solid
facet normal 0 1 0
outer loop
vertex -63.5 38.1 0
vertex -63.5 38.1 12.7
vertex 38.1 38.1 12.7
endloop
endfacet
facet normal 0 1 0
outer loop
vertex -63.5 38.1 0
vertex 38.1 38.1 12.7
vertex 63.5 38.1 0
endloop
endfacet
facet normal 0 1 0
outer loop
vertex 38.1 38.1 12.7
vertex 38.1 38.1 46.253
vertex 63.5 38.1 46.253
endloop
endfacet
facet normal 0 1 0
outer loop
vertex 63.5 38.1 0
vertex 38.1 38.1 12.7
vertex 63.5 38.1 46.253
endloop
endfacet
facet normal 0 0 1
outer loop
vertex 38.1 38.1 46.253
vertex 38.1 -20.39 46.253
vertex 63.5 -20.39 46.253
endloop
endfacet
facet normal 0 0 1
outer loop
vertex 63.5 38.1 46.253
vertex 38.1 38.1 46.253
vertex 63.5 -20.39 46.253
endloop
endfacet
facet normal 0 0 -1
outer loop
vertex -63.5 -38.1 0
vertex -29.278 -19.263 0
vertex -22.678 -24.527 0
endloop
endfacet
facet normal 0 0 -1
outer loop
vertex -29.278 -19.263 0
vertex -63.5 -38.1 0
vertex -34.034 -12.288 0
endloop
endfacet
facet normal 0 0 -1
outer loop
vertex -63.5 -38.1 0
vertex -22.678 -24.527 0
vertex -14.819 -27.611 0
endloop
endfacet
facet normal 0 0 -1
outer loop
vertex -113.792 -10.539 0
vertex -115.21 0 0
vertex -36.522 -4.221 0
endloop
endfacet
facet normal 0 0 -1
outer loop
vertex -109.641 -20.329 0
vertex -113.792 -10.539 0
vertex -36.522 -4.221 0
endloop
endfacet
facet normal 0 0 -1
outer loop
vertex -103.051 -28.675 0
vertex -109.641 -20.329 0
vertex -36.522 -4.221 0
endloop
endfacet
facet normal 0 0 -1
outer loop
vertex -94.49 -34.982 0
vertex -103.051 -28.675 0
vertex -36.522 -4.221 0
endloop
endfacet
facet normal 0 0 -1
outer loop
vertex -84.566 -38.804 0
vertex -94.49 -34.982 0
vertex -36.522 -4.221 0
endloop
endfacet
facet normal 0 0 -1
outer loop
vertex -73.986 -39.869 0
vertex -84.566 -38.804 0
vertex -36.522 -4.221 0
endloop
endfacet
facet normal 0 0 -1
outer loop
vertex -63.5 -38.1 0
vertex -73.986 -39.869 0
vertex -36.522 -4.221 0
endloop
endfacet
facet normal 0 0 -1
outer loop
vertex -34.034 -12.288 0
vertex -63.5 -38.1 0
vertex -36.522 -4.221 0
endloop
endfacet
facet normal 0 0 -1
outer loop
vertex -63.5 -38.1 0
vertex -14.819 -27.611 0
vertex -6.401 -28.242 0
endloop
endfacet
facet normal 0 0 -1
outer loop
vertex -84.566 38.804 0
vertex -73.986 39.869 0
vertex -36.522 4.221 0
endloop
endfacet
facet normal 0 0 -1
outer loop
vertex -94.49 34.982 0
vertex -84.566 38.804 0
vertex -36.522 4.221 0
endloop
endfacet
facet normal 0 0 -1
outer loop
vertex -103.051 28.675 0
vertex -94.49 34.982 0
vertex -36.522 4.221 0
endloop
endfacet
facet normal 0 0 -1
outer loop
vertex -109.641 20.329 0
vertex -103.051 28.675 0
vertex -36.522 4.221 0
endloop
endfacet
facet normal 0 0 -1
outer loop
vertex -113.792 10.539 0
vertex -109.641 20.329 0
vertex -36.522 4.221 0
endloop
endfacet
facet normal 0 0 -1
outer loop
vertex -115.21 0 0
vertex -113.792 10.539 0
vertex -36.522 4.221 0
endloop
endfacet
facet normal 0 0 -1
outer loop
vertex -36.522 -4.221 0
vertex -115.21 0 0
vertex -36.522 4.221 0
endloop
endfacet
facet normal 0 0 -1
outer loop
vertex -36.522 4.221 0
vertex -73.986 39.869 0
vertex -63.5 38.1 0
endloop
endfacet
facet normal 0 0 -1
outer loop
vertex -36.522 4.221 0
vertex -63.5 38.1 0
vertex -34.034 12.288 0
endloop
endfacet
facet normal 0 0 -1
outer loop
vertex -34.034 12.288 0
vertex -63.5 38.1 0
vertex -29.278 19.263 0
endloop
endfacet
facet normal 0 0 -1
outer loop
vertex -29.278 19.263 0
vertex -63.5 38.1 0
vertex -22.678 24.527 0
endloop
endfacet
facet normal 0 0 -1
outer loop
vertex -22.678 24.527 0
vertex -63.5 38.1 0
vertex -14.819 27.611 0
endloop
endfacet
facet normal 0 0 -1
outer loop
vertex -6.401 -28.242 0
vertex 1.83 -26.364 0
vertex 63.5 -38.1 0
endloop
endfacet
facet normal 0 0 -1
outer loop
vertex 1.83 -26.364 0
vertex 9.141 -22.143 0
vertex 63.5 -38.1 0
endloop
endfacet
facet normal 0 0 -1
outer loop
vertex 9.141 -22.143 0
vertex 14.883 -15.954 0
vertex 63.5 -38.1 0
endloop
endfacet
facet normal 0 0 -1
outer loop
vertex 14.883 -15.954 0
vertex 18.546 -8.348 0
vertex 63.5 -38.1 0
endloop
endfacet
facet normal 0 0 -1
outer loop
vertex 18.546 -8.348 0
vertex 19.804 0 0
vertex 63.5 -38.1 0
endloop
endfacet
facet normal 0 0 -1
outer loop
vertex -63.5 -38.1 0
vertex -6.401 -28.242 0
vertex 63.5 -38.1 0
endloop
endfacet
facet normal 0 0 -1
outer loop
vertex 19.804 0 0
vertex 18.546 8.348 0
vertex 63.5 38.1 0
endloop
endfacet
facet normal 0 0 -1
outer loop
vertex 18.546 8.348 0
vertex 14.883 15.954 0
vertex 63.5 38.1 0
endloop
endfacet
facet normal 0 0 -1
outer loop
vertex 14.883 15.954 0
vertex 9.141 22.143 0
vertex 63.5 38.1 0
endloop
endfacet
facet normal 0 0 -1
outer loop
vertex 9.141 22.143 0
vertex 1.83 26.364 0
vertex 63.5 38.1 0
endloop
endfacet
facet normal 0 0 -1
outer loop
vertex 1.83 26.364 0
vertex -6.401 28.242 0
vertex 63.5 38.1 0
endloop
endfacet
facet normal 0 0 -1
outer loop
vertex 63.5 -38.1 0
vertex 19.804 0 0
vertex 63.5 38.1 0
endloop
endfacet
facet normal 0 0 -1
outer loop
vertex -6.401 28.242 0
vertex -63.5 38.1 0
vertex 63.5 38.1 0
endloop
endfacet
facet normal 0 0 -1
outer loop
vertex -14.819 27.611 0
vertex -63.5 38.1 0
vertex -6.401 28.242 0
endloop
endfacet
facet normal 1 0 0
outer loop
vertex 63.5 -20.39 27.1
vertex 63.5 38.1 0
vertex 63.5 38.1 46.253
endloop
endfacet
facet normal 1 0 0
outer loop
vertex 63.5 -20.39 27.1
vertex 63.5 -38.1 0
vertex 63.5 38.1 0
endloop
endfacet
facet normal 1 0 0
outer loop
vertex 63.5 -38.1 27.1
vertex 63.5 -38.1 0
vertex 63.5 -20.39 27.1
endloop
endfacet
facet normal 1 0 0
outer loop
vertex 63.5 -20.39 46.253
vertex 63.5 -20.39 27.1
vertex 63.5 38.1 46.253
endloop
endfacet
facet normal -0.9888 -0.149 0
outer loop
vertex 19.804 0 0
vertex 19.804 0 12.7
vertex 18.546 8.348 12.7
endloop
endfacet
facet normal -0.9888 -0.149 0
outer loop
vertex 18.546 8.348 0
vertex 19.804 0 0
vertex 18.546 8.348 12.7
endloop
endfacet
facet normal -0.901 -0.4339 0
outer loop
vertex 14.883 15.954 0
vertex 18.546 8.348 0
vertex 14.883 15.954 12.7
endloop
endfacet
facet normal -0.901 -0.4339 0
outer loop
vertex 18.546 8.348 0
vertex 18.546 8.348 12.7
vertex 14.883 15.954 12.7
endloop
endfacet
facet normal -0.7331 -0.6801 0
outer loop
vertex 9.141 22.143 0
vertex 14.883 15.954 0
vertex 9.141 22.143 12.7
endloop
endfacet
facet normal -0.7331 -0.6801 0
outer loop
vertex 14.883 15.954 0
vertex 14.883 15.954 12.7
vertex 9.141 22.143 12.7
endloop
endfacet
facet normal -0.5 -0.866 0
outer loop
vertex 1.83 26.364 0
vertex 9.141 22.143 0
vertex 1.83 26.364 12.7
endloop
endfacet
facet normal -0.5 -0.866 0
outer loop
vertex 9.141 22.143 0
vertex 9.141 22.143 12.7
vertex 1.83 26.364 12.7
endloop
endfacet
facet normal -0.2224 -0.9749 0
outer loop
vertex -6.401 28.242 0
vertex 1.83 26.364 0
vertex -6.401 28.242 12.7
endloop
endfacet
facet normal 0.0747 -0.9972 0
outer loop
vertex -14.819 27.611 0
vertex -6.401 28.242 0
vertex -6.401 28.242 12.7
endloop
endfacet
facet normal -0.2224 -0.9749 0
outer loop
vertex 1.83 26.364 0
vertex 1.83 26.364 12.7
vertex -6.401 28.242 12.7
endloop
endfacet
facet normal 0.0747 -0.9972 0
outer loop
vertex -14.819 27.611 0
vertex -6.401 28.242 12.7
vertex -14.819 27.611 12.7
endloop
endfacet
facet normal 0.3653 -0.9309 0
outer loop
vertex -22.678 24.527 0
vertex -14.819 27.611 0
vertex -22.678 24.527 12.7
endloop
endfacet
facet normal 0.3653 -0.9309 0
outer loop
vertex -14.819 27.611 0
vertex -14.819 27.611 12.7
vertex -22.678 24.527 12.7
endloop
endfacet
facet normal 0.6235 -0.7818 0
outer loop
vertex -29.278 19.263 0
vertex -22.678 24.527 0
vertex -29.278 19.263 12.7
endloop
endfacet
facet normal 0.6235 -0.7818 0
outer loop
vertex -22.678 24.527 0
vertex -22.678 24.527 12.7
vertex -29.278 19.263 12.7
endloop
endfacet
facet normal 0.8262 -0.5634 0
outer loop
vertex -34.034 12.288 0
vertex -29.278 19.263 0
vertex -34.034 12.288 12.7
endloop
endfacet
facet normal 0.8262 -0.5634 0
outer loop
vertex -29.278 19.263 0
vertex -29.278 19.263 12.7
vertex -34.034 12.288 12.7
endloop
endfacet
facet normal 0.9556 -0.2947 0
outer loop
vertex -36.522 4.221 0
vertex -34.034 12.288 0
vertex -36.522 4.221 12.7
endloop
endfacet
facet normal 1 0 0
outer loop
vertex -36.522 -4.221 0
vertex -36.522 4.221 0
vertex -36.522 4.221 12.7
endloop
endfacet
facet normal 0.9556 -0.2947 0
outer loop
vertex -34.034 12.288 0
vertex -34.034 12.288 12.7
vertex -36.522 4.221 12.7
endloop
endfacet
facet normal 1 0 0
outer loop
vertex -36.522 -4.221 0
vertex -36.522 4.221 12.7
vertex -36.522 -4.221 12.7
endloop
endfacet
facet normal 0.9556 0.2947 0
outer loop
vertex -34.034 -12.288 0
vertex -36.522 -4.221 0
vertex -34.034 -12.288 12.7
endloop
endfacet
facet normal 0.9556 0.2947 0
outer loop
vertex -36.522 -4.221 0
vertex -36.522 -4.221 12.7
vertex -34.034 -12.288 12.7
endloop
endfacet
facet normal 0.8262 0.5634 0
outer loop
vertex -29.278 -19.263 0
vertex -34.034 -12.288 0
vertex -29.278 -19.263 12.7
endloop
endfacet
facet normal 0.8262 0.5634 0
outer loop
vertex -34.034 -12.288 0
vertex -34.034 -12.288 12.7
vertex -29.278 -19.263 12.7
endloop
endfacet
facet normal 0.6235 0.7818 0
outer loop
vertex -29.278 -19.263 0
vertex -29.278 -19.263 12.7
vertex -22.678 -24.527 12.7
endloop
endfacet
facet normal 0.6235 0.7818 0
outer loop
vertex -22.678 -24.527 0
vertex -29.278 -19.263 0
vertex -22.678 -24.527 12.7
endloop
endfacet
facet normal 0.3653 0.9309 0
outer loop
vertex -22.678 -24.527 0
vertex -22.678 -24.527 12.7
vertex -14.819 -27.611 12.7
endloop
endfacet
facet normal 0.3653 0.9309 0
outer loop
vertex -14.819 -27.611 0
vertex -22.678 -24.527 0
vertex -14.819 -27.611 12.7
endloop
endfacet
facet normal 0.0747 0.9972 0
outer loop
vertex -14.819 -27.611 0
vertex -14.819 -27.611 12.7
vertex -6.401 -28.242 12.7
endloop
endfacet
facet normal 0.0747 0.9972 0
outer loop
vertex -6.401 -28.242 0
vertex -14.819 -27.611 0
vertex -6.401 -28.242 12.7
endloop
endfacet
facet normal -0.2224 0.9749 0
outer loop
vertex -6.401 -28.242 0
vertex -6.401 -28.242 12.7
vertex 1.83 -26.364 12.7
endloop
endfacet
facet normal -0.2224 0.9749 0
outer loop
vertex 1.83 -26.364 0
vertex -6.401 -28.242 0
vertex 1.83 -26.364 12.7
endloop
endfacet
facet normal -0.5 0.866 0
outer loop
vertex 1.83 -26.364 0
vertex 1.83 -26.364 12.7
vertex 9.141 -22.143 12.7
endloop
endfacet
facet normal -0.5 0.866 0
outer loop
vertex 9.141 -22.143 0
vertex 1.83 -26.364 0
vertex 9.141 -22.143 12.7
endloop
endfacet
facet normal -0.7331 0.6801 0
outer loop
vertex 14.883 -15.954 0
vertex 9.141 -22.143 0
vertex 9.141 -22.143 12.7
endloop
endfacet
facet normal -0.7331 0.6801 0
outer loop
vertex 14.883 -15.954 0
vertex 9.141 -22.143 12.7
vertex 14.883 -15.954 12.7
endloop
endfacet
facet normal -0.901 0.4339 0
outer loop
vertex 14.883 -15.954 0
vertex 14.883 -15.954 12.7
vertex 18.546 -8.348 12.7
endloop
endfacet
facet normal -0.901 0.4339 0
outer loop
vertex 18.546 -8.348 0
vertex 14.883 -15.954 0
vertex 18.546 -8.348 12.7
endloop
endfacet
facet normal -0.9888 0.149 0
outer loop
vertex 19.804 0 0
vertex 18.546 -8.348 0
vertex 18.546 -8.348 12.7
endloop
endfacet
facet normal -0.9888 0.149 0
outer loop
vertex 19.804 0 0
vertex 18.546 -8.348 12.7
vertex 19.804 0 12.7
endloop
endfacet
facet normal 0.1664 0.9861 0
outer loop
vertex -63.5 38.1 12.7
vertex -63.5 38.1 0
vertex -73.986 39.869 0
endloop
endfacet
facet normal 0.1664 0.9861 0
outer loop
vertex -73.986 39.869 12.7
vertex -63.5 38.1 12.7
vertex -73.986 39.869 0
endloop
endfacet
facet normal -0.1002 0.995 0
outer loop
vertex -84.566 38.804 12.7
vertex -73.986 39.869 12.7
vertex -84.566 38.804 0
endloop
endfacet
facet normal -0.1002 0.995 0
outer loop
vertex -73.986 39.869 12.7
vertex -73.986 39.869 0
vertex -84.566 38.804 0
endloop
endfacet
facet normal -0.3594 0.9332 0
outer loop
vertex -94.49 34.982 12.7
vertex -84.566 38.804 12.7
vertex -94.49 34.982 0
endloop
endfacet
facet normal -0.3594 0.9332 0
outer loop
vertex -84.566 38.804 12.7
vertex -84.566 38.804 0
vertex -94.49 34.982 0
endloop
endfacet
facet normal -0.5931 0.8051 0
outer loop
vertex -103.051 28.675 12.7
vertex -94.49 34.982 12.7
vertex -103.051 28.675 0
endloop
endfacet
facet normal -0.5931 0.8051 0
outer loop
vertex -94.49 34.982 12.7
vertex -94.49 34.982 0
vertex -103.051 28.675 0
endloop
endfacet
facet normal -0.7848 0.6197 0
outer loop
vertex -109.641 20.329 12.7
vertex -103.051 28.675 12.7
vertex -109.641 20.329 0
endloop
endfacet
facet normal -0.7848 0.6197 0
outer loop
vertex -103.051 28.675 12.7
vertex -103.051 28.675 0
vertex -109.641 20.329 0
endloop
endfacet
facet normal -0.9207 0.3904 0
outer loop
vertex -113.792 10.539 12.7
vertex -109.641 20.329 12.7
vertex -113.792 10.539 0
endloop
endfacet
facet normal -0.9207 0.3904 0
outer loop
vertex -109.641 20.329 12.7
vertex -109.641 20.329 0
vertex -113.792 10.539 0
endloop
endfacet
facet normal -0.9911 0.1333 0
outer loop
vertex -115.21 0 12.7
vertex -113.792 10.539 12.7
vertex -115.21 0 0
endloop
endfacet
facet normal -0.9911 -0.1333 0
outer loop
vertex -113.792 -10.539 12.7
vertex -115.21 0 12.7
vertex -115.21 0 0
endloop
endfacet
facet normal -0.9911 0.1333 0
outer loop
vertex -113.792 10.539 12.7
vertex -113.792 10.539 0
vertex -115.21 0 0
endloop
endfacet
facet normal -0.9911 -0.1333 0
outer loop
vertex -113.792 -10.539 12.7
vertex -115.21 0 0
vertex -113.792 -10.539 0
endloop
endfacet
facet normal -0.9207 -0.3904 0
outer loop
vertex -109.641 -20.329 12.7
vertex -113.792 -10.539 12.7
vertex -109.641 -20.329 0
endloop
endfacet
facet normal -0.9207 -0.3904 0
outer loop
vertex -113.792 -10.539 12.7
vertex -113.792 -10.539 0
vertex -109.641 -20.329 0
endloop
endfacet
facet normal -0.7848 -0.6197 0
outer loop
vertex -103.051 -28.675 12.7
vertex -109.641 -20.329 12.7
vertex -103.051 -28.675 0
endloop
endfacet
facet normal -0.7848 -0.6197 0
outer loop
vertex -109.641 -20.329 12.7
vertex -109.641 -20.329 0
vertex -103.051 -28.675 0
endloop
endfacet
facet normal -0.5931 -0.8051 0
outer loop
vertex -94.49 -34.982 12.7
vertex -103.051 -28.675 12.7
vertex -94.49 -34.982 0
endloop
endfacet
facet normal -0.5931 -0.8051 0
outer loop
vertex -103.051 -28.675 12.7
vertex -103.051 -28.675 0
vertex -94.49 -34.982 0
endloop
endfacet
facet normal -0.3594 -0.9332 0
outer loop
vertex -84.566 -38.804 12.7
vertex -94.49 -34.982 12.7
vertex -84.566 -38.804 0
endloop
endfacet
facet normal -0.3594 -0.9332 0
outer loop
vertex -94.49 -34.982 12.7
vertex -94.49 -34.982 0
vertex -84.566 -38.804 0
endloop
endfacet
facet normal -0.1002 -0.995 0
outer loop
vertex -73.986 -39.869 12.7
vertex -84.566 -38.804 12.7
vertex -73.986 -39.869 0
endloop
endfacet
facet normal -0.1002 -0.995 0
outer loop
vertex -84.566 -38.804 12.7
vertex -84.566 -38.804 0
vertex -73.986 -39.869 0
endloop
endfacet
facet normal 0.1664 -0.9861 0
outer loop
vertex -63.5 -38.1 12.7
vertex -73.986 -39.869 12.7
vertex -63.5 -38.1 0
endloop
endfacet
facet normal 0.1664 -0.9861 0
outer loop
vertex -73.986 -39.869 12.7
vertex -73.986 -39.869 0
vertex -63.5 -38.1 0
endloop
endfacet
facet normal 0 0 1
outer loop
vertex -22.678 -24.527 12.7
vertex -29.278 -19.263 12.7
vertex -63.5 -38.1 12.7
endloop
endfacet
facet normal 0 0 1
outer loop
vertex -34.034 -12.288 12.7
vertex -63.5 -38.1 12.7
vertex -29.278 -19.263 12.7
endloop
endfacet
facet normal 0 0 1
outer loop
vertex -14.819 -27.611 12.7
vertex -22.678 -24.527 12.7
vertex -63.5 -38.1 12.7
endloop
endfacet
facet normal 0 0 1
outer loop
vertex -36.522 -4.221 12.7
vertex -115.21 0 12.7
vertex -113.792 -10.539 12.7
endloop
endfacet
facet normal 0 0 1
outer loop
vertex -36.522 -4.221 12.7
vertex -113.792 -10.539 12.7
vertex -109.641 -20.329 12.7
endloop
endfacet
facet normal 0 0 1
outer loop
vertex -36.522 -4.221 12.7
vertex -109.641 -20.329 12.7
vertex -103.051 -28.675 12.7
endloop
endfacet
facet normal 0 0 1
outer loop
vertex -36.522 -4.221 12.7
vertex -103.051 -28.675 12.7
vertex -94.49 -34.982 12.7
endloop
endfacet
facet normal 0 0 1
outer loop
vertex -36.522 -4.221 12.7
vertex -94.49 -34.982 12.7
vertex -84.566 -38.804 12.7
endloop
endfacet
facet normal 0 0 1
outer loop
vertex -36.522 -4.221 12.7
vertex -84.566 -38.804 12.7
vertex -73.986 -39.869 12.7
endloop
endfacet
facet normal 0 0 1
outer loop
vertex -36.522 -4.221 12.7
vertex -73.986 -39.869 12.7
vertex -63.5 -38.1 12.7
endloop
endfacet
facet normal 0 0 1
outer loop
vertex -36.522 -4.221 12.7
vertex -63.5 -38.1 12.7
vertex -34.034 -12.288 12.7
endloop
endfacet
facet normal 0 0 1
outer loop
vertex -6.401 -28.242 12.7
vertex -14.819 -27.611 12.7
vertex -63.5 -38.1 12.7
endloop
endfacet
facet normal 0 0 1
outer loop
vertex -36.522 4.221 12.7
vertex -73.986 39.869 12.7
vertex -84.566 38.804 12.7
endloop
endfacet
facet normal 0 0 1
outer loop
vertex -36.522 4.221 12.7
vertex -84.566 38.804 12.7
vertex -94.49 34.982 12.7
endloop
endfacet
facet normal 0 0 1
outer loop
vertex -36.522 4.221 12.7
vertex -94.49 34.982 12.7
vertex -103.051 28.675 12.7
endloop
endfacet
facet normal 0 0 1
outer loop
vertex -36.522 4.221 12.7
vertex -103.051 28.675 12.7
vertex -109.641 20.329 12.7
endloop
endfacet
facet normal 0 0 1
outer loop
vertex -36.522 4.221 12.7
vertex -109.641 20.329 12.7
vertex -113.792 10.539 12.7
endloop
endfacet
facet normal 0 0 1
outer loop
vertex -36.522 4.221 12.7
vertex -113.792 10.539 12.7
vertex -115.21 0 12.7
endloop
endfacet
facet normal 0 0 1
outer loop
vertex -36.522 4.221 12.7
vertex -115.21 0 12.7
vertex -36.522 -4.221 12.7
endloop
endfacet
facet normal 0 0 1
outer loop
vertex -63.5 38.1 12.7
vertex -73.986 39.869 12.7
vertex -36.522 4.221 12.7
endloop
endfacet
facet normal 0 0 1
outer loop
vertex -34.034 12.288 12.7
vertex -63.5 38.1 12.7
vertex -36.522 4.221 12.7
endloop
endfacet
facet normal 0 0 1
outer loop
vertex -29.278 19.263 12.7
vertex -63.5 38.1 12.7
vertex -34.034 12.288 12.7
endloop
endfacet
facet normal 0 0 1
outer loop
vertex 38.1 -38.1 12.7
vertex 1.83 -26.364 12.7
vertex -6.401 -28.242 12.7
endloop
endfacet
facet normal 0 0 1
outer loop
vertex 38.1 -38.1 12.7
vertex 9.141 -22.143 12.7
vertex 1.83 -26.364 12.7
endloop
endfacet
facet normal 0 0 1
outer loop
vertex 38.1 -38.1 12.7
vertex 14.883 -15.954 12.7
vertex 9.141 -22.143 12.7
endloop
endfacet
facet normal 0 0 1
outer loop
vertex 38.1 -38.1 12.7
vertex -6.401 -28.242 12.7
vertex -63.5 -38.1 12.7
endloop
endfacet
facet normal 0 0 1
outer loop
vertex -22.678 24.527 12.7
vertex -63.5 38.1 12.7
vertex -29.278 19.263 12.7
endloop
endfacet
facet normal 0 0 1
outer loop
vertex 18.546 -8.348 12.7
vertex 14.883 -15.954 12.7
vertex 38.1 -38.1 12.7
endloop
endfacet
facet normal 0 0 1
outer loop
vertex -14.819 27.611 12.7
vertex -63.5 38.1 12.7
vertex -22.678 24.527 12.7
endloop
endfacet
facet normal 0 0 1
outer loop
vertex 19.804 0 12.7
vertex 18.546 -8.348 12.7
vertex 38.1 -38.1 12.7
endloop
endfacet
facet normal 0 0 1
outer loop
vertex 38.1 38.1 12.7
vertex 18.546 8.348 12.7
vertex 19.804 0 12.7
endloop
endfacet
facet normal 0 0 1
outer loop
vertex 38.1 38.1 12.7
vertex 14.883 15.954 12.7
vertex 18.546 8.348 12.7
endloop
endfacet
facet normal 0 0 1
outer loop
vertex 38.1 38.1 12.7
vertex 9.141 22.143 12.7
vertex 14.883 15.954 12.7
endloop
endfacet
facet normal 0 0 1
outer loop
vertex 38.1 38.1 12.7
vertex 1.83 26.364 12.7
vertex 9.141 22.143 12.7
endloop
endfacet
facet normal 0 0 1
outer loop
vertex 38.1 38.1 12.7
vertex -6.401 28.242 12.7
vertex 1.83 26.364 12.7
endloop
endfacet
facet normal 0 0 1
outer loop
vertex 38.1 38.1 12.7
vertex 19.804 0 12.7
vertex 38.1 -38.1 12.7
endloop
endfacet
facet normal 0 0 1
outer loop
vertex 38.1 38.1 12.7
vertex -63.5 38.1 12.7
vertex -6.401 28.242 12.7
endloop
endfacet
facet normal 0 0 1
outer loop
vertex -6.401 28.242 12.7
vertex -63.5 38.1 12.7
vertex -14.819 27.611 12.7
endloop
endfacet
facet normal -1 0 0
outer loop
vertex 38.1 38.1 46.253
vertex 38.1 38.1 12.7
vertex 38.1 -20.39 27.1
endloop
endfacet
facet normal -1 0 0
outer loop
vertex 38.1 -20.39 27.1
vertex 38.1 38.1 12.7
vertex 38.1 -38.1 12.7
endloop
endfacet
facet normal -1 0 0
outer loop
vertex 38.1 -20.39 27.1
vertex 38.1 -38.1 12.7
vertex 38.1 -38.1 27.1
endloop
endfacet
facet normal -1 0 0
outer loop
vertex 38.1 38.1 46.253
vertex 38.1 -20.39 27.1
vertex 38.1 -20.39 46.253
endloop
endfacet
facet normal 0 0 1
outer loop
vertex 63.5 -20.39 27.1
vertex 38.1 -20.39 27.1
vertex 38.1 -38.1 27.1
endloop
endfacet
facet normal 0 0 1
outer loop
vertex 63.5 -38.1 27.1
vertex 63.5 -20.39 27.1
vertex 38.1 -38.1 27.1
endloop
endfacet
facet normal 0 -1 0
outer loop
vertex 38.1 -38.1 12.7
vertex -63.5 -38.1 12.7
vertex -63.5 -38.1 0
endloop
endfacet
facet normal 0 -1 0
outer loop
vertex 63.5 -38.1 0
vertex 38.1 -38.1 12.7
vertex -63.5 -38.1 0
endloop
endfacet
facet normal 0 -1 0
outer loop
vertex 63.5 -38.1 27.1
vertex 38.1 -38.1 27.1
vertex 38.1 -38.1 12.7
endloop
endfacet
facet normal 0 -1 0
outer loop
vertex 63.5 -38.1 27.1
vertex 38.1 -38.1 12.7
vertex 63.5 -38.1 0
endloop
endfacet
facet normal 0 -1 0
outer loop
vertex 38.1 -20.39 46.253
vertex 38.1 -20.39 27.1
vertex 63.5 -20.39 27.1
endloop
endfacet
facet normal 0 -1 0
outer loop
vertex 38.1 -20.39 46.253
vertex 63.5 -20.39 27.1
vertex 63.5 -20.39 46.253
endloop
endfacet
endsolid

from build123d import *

# Parameters (mm, degrees)
F0_W     = 127
F0_H     = 76.2
F1_DEPTH = 12.7
F2_W     = 25.4
F2_H     = 33.5525823757
F3_DEPTH = 38.1
F4_W     = 17.7103555709
F4_H     = 19.1524197951
F5_DEPTH = 25.401
F6_R     = 28.3213454148
F7_DEPTH = 12.701


with BuildPart() as f1:
    # F0 (on Top) → F1 (new body)
    with BuildSketch(Plane.XY):
        Rectangle(F0_W, F0_H)
        with BuildLine():
            Line((-63.5, -38.1), (-63.5, 38.1))
            ThreePointArc((-63.5, 38.1), (-115.2096482651, 0), (-63.5, -38.1))
        make_face()
    extrude(amount=F1_DEPTH)

    # F2 (on Front) → F3 (join, symmetric)
    with BuildSketch(Plane.XZ):
        with Locations((50.8, 29.4762911879)):
            Rectangle(F2_W, F2_H)
    extrude(amount=F3_DEPTH, both=True)

    # F4 (on face) → F5 (cut, through all)
    with BuildSketch(Plane(origin=(38.1, 0, 0), x_dir=(0, -1, 0), z_dir=(-1, 0, 0))):
        with Locations((29.2448222145, 36.6763724782)):
            Rectangle(F4_W, F4_H)
    extrude(amount=-F5_DEPTH, mode=Mode.SUBTRACT)

    # F6 (on face) → F7 (cut, through all)
    with BuildSketch(Plane.XY.offset(12.7)):
        with Locations((-8.5171926767, 0)):
            Circle(F6_R)
    extrude(amount=-F7_DEPTH, mode=Mode.SUBTRACT)


solid = f1.part
